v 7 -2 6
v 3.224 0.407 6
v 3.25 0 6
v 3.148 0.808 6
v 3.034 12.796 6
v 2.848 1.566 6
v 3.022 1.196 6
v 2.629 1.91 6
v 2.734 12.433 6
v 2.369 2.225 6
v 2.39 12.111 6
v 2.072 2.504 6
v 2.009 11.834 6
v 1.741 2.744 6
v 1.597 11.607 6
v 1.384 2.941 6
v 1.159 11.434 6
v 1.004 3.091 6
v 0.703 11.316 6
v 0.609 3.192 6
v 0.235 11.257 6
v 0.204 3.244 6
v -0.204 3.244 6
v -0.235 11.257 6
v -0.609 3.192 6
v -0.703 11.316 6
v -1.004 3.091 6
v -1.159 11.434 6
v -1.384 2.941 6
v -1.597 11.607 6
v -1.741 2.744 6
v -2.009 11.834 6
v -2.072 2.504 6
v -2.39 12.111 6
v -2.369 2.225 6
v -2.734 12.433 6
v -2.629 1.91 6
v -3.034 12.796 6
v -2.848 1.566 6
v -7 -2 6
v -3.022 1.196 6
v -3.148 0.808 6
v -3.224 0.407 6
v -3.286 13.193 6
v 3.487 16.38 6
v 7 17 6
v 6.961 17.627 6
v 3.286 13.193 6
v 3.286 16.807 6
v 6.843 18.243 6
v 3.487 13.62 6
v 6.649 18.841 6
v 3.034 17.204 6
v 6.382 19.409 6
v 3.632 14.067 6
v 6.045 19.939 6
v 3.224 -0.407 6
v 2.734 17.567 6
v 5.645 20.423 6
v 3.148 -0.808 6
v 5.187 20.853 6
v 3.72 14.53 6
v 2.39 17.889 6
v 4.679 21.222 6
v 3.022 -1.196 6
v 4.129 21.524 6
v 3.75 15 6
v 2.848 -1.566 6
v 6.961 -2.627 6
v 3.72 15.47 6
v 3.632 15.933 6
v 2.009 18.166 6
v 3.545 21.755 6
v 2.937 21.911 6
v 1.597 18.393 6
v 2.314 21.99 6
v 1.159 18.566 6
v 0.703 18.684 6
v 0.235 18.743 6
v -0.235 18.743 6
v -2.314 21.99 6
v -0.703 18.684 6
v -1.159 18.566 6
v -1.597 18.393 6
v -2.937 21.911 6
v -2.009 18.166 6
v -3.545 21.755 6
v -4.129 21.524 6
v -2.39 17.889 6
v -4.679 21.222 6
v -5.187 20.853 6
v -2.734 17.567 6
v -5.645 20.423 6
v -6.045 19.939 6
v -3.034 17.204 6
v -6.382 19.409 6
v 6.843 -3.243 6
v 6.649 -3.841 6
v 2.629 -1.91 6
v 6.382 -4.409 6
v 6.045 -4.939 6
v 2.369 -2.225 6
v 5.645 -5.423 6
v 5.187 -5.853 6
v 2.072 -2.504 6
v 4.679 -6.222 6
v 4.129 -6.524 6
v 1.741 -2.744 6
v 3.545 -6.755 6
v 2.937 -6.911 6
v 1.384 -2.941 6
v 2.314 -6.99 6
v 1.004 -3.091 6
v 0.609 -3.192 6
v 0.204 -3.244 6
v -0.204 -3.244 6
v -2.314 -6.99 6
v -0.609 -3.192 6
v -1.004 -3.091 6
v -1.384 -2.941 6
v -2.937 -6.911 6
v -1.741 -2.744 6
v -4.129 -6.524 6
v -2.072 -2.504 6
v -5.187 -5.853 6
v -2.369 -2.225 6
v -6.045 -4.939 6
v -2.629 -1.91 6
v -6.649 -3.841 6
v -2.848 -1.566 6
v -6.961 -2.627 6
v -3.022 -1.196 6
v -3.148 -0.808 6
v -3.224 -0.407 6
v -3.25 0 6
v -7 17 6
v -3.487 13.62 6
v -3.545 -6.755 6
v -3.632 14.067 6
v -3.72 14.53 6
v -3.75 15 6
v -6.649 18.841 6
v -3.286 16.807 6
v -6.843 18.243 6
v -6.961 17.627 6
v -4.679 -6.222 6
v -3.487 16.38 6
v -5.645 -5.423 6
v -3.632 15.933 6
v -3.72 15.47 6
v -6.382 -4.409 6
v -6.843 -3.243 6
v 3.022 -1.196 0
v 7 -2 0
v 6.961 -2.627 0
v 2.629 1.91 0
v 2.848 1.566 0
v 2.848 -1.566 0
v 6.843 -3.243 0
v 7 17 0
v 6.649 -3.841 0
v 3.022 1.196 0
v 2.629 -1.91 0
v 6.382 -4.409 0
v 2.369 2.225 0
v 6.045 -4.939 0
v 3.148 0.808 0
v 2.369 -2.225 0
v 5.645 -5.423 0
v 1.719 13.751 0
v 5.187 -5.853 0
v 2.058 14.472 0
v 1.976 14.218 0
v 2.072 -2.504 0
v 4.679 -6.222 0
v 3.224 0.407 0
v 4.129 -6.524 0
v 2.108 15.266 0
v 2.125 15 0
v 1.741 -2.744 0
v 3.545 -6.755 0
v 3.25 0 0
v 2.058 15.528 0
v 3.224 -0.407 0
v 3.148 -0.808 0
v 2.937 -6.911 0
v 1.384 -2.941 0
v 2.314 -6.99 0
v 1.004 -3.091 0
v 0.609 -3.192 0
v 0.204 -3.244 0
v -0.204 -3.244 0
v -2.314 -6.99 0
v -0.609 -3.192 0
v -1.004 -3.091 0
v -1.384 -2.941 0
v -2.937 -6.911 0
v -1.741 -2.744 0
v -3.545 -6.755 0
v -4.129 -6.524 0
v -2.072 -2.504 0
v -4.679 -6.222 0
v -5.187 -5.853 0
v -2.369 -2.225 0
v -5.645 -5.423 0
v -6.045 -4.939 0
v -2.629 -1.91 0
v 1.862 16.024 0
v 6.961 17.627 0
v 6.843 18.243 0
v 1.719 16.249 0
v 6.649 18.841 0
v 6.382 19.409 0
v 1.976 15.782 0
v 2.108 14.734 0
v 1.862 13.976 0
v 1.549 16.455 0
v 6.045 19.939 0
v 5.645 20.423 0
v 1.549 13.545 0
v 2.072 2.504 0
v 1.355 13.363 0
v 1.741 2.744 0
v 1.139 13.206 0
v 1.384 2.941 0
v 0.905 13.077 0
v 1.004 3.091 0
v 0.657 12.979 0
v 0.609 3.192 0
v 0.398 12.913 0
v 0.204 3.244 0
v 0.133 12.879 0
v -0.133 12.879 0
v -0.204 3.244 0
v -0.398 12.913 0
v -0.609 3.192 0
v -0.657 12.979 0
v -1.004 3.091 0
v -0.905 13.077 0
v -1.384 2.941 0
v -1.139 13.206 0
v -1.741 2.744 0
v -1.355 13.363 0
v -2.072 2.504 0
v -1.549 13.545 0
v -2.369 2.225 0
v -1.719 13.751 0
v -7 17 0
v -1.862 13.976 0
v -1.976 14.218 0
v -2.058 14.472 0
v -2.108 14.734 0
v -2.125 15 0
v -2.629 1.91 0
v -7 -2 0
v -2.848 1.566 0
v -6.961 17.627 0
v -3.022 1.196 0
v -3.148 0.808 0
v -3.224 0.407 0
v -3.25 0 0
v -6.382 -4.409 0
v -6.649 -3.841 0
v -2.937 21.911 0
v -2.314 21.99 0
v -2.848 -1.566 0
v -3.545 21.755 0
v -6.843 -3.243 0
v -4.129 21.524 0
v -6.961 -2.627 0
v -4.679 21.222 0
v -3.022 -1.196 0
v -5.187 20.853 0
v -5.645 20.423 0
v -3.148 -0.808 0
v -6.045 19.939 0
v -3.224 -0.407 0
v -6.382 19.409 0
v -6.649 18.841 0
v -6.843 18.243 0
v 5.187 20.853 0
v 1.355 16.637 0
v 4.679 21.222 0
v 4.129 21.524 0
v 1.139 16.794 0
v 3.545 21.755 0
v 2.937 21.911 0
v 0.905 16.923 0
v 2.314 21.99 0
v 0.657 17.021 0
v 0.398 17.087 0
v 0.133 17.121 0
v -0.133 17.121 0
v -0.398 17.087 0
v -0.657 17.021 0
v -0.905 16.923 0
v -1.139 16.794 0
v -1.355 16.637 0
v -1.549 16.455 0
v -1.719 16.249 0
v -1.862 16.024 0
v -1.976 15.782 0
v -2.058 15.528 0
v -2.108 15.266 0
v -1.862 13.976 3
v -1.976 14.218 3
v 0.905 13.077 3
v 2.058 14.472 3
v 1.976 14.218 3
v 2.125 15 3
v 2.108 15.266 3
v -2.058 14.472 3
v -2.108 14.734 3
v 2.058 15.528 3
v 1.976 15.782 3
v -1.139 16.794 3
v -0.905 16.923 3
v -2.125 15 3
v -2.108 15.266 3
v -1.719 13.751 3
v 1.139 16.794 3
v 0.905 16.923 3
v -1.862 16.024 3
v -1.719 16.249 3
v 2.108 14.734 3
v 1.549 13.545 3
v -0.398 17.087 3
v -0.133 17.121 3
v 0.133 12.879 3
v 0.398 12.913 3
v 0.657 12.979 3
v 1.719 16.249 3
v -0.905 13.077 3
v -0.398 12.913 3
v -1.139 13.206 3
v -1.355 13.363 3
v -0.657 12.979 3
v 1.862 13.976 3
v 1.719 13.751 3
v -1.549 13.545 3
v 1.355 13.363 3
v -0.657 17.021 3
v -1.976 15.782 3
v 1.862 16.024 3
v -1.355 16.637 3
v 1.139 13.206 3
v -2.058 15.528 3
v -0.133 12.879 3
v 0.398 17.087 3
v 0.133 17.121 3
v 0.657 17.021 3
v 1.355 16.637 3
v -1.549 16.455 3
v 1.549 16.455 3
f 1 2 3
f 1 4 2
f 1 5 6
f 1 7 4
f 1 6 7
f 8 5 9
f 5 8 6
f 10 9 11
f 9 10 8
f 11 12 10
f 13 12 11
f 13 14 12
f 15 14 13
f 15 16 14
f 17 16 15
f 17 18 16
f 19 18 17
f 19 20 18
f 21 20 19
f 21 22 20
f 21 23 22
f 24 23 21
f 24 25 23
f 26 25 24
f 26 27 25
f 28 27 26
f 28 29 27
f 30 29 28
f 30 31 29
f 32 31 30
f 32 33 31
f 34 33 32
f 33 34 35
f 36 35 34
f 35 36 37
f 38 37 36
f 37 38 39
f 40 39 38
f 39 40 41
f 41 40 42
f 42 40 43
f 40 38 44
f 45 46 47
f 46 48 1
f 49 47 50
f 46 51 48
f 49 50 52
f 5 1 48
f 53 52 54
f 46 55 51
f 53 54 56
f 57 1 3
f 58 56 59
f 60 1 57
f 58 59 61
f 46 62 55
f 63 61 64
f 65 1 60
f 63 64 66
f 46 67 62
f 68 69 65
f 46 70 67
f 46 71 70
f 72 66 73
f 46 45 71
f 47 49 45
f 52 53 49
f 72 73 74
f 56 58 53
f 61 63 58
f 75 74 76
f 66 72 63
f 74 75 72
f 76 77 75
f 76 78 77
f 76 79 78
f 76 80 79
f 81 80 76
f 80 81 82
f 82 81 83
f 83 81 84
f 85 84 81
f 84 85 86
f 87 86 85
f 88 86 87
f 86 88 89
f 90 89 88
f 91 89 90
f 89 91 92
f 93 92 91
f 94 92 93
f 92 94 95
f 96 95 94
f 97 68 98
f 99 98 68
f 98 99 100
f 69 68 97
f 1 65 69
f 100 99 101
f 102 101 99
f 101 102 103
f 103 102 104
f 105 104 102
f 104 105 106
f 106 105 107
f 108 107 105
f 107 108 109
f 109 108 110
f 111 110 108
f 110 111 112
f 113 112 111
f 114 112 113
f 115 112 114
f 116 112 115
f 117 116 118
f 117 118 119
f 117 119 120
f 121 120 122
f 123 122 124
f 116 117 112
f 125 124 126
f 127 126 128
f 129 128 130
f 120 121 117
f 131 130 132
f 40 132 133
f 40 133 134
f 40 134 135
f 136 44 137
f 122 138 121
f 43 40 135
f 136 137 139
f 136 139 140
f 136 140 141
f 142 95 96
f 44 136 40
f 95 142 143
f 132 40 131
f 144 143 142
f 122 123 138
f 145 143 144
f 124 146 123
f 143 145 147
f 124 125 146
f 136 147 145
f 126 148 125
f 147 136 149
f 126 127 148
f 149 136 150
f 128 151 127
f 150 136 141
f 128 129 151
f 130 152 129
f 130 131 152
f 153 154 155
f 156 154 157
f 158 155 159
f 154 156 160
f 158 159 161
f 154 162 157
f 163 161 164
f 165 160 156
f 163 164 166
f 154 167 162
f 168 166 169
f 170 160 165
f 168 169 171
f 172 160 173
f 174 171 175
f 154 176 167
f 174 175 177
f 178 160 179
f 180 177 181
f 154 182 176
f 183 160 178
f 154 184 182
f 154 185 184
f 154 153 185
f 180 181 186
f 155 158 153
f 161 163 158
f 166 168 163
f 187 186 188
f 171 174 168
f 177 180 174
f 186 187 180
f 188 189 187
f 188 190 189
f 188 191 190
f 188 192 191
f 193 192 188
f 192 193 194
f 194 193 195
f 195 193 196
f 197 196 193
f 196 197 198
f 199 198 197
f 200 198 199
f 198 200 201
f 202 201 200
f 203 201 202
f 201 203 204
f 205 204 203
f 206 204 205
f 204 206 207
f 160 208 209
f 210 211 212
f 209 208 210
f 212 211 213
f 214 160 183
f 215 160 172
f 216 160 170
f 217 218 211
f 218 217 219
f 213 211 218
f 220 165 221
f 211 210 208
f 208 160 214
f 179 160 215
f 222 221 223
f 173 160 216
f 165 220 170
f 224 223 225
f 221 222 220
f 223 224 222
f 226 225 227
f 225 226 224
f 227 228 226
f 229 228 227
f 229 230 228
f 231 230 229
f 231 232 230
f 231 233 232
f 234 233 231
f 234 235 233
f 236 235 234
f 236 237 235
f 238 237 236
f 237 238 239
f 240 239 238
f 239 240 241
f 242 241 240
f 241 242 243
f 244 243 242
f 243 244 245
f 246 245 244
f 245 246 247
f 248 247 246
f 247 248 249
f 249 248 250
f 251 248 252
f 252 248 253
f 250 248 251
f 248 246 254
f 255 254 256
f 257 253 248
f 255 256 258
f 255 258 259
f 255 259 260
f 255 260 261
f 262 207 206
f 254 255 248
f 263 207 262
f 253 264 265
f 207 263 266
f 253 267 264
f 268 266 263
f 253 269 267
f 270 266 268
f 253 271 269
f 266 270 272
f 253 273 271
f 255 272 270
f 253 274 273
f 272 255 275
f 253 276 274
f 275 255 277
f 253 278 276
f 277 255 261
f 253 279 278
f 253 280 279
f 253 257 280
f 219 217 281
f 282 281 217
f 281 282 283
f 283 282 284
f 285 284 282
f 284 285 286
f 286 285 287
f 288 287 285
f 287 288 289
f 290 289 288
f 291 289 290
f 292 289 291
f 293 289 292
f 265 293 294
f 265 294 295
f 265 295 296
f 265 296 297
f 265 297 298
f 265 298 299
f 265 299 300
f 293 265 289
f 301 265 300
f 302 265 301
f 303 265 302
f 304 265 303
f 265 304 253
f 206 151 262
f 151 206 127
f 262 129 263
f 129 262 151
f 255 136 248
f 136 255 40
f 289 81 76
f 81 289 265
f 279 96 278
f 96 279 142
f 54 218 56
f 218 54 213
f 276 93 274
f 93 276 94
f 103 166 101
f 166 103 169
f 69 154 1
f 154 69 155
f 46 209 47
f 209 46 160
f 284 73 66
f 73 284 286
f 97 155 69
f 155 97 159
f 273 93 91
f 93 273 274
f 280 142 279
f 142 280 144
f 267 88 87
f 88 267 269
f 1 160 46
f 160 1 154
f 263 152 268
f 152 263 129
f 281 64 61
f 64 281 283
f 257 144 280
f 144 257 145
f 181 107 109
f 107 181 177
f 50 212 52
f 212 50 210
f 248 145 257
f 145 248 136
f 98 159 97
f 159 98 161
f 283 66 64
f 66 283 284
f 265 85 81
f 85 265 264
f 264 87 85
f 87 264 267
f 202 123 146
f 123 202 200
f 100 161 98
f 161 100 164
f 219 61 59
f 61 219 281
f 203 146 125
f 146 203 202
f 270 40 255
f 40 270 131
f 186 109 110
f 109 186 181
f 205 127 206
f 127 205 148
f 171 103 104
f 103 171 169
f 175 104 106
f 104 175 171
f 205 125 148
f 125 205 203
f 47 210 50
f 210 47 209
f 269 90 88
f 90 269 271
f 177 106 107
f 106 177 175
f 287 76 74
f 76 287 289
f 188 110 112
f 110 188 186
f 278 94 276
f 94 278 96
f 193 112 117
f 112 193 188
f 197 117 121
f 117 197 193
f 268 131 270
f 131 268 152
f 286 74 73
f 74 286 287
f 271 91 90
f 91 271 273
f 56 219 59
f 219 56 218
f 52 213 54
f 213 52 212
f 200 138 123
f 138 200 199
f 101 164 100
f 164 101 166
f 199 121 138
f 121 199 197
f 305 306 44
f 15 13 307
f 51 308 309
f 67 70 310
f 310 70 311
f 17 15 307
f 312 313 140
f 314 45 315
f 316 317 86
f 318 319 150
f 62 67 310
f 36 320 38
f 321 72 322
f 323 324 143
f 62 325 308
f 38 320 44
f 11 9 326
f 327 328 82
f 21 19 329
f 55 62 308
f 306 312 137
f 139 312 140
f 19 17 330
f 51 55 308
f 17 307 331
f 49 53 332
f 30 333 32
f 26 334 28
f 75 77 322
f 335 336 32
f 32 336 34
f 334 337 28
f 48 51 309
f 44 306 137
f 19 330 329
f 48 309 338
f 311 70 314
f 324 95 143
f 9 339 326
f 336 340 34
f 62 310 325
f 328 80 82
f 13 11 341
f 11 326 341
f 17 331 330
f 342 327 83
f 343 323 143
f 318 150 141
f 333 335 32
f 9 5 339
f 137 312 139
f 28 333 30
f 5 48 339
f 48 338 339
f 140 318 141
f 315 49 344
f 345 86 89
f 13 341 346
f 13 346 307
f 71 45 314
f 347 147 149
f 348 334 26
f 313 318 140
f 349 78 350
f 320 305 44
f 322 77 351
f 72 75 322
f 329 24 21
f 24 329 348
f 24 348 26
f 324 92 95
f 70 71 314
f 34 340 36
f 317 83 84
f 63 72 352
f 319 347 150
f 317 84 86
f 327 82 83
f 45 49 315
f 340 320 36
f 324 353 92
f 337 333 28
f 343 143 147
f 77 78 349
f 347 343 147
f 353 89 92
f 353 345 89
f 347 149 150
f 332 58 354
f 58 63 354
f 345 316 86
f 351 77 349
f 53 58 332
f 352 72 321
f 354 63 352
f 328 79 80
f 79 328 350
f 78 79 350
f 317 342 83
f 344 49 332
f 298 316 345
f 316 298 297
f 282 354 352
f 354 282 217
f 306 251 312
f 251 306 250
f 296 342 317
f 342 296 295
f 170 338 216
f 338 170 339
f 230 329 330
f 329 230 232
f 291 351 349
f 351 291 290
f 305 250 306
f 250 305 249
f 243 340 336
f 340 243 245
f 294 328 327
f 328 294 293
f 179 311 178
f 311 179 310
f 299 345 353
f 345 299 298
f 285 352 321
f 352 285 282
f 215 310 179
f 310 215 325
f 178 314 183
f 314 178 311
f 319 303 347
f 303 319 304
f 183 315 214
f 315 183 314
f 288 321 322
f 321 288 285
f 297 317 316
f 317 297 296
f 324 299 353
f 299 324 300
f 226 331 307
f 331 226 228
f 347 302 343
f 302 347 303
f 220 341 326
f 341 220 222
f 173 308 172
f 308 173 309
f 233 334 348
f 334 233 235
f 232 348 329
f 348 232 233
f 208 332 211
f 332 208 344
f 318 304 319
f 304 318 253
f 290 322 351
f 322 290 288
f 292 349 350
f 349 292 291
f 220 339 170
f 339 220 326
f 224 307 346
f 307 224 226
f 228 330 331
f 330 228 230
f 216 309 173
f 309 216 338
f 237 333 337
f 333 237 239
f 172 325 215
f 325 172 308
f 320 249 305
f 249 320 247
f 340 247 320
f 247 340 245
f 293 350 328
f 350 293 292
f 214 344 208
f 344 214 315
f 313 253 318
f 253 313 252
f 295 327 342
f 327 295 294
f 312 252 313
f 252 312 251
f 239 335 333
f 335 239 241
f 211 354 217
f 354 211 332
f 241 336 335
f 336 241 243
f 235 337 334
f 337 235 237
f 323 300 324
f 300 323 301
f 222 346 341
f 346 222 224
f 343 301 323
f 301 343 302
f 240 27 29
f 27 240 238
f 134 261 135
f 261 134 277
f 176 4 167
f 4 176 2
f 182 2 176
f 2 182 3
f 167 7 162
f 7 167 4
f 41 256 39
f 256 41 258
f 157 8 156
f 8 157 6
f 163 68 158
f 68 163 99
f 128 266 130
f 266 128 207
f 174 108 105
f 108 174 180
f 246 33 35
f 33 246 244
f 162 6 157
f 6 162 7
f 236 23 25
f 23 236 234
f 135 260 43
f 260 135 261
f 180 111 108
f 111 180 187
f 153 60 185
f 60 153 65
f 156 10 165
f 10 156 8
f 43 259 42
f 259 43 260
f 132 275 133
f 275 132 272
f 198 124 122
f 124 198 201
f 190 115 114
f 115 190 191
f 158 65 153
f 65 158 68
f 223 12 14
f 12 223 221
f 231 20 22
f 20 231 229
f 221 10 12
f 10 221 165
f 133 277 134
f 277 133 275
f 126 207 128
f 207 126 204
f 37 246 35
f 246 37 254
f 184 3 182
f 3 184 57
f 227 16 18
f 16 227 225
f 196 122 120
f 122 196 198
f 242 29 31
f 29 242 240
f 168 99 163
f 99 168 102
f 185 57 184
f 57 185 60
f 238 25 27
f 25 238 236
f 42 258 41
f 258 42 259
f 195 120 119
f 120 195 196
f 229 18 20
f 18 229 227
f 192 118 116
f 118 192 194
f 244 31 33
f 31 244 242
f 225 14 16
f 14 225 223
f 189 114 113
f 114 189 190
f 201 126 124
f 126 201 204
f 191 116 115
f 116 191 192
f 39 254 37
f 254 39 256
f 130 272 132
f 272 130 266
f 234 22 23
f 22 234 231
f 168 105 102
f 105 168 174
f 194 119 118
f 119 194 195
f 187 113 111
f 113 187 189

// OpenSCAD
$fn = 50;


difference() {
	union() {
		cylinder(h = 6, r = 7.0000000000);
		translate(v = [0.0000000000, 7.5000000000, 0]) {
			hull() {
				translate(v = [-2.0000000000, 9.5000000000, 0]) {
					cylinder(h = 6, r = 5);
				}
				translate(v = [2.0000000000, 9.5000000000, 0]) {
					cylinder(h = 6, r = 5);
				}
				translate(v = [-2.0000000000, -9.5000000000, 0]) {
					cylinder(h = 6, r = 5);
				}
				translate(v = [2.0000000000, -9.5000000000, 0]) {
					cylinder(h = 6, r = 5);
				}
			}
		}
		translate(v = [0.0000000000, 7.5000000000, 0]) {
			hull() {
				translate(v = [-2.0000000000, 9.5000000000, 0]) {
					cylinder(h = 6, r = 5);
				}
				translate(v = [2.0000000000, 9.5000000000, 0]) {
					cylinder(h = 6, r = 5);
				}
				translate(v = [-2.0000000000, -9.5000000000, 0]) {
					cylinder(h = 6, r = 5);
				}
				translate(v = [2.0000000000, -9.5000000000, 0]) {
					cylinder(h = 6, r = 5);
				}
			}
		}
	}
	union() {
		translate(v = [0.0000000000, 15.0000000000, 6]) {
			rotate(a = [0, 0, 0]) {
				difference() {
					union() {
						#translate(v = [0, 0, -6.0000000000]) {
							cylinder(h = 6, r = 2.0000000000);
						}
						#translate(v = [0, 0, -3]) {
							cylinder(h = 3, r1 = 2.1250000000, r2 = 3.7500000000);
						}
						#translate(v = [0, 0, -6.0000000000]) {
							cylinder(h = 6, r = 2.1250000000);
						}
						#translate(v = [0, 0, -6.0000000000]) {
							cylinder(h = 6, r = 2.0000000000);
						}
					}
					union();
				}
			}
		}
		translate(v = [0.0000000000, 15.0000000000, 6]) {
			rotate(a = [0, 0, 0]) {
				difference() {
					union() {
						#translate(v = [0, 0, -6.0000000000]) {
							cylinder(h = 6, r = 2.0000000000);
						}
						#translate(v = [0, 0, -3]) {
							cylinder(h = 3, r1 = 2.1250000000, r2 = 3.7500000000);
						}
						#translate(v = [0, 0, -6.0000000000]) {
							cylinder(h = 6, r = 2.1250000000);
						}
						#translate(v = [0, 0, -6.0000000000]) {
							cylinder(h = 6, r = 2.0000000000);
						}
					}
					union();
				}
			}
		}
		translate(v = [0, 0, -100]) {
			cylinder(h = 200, r = 3.2500000000);
		}
		translate(v = [0, 0, -100]) {
			cylinder(h = 200, r = 1.8000000000);
		}
	}
}
